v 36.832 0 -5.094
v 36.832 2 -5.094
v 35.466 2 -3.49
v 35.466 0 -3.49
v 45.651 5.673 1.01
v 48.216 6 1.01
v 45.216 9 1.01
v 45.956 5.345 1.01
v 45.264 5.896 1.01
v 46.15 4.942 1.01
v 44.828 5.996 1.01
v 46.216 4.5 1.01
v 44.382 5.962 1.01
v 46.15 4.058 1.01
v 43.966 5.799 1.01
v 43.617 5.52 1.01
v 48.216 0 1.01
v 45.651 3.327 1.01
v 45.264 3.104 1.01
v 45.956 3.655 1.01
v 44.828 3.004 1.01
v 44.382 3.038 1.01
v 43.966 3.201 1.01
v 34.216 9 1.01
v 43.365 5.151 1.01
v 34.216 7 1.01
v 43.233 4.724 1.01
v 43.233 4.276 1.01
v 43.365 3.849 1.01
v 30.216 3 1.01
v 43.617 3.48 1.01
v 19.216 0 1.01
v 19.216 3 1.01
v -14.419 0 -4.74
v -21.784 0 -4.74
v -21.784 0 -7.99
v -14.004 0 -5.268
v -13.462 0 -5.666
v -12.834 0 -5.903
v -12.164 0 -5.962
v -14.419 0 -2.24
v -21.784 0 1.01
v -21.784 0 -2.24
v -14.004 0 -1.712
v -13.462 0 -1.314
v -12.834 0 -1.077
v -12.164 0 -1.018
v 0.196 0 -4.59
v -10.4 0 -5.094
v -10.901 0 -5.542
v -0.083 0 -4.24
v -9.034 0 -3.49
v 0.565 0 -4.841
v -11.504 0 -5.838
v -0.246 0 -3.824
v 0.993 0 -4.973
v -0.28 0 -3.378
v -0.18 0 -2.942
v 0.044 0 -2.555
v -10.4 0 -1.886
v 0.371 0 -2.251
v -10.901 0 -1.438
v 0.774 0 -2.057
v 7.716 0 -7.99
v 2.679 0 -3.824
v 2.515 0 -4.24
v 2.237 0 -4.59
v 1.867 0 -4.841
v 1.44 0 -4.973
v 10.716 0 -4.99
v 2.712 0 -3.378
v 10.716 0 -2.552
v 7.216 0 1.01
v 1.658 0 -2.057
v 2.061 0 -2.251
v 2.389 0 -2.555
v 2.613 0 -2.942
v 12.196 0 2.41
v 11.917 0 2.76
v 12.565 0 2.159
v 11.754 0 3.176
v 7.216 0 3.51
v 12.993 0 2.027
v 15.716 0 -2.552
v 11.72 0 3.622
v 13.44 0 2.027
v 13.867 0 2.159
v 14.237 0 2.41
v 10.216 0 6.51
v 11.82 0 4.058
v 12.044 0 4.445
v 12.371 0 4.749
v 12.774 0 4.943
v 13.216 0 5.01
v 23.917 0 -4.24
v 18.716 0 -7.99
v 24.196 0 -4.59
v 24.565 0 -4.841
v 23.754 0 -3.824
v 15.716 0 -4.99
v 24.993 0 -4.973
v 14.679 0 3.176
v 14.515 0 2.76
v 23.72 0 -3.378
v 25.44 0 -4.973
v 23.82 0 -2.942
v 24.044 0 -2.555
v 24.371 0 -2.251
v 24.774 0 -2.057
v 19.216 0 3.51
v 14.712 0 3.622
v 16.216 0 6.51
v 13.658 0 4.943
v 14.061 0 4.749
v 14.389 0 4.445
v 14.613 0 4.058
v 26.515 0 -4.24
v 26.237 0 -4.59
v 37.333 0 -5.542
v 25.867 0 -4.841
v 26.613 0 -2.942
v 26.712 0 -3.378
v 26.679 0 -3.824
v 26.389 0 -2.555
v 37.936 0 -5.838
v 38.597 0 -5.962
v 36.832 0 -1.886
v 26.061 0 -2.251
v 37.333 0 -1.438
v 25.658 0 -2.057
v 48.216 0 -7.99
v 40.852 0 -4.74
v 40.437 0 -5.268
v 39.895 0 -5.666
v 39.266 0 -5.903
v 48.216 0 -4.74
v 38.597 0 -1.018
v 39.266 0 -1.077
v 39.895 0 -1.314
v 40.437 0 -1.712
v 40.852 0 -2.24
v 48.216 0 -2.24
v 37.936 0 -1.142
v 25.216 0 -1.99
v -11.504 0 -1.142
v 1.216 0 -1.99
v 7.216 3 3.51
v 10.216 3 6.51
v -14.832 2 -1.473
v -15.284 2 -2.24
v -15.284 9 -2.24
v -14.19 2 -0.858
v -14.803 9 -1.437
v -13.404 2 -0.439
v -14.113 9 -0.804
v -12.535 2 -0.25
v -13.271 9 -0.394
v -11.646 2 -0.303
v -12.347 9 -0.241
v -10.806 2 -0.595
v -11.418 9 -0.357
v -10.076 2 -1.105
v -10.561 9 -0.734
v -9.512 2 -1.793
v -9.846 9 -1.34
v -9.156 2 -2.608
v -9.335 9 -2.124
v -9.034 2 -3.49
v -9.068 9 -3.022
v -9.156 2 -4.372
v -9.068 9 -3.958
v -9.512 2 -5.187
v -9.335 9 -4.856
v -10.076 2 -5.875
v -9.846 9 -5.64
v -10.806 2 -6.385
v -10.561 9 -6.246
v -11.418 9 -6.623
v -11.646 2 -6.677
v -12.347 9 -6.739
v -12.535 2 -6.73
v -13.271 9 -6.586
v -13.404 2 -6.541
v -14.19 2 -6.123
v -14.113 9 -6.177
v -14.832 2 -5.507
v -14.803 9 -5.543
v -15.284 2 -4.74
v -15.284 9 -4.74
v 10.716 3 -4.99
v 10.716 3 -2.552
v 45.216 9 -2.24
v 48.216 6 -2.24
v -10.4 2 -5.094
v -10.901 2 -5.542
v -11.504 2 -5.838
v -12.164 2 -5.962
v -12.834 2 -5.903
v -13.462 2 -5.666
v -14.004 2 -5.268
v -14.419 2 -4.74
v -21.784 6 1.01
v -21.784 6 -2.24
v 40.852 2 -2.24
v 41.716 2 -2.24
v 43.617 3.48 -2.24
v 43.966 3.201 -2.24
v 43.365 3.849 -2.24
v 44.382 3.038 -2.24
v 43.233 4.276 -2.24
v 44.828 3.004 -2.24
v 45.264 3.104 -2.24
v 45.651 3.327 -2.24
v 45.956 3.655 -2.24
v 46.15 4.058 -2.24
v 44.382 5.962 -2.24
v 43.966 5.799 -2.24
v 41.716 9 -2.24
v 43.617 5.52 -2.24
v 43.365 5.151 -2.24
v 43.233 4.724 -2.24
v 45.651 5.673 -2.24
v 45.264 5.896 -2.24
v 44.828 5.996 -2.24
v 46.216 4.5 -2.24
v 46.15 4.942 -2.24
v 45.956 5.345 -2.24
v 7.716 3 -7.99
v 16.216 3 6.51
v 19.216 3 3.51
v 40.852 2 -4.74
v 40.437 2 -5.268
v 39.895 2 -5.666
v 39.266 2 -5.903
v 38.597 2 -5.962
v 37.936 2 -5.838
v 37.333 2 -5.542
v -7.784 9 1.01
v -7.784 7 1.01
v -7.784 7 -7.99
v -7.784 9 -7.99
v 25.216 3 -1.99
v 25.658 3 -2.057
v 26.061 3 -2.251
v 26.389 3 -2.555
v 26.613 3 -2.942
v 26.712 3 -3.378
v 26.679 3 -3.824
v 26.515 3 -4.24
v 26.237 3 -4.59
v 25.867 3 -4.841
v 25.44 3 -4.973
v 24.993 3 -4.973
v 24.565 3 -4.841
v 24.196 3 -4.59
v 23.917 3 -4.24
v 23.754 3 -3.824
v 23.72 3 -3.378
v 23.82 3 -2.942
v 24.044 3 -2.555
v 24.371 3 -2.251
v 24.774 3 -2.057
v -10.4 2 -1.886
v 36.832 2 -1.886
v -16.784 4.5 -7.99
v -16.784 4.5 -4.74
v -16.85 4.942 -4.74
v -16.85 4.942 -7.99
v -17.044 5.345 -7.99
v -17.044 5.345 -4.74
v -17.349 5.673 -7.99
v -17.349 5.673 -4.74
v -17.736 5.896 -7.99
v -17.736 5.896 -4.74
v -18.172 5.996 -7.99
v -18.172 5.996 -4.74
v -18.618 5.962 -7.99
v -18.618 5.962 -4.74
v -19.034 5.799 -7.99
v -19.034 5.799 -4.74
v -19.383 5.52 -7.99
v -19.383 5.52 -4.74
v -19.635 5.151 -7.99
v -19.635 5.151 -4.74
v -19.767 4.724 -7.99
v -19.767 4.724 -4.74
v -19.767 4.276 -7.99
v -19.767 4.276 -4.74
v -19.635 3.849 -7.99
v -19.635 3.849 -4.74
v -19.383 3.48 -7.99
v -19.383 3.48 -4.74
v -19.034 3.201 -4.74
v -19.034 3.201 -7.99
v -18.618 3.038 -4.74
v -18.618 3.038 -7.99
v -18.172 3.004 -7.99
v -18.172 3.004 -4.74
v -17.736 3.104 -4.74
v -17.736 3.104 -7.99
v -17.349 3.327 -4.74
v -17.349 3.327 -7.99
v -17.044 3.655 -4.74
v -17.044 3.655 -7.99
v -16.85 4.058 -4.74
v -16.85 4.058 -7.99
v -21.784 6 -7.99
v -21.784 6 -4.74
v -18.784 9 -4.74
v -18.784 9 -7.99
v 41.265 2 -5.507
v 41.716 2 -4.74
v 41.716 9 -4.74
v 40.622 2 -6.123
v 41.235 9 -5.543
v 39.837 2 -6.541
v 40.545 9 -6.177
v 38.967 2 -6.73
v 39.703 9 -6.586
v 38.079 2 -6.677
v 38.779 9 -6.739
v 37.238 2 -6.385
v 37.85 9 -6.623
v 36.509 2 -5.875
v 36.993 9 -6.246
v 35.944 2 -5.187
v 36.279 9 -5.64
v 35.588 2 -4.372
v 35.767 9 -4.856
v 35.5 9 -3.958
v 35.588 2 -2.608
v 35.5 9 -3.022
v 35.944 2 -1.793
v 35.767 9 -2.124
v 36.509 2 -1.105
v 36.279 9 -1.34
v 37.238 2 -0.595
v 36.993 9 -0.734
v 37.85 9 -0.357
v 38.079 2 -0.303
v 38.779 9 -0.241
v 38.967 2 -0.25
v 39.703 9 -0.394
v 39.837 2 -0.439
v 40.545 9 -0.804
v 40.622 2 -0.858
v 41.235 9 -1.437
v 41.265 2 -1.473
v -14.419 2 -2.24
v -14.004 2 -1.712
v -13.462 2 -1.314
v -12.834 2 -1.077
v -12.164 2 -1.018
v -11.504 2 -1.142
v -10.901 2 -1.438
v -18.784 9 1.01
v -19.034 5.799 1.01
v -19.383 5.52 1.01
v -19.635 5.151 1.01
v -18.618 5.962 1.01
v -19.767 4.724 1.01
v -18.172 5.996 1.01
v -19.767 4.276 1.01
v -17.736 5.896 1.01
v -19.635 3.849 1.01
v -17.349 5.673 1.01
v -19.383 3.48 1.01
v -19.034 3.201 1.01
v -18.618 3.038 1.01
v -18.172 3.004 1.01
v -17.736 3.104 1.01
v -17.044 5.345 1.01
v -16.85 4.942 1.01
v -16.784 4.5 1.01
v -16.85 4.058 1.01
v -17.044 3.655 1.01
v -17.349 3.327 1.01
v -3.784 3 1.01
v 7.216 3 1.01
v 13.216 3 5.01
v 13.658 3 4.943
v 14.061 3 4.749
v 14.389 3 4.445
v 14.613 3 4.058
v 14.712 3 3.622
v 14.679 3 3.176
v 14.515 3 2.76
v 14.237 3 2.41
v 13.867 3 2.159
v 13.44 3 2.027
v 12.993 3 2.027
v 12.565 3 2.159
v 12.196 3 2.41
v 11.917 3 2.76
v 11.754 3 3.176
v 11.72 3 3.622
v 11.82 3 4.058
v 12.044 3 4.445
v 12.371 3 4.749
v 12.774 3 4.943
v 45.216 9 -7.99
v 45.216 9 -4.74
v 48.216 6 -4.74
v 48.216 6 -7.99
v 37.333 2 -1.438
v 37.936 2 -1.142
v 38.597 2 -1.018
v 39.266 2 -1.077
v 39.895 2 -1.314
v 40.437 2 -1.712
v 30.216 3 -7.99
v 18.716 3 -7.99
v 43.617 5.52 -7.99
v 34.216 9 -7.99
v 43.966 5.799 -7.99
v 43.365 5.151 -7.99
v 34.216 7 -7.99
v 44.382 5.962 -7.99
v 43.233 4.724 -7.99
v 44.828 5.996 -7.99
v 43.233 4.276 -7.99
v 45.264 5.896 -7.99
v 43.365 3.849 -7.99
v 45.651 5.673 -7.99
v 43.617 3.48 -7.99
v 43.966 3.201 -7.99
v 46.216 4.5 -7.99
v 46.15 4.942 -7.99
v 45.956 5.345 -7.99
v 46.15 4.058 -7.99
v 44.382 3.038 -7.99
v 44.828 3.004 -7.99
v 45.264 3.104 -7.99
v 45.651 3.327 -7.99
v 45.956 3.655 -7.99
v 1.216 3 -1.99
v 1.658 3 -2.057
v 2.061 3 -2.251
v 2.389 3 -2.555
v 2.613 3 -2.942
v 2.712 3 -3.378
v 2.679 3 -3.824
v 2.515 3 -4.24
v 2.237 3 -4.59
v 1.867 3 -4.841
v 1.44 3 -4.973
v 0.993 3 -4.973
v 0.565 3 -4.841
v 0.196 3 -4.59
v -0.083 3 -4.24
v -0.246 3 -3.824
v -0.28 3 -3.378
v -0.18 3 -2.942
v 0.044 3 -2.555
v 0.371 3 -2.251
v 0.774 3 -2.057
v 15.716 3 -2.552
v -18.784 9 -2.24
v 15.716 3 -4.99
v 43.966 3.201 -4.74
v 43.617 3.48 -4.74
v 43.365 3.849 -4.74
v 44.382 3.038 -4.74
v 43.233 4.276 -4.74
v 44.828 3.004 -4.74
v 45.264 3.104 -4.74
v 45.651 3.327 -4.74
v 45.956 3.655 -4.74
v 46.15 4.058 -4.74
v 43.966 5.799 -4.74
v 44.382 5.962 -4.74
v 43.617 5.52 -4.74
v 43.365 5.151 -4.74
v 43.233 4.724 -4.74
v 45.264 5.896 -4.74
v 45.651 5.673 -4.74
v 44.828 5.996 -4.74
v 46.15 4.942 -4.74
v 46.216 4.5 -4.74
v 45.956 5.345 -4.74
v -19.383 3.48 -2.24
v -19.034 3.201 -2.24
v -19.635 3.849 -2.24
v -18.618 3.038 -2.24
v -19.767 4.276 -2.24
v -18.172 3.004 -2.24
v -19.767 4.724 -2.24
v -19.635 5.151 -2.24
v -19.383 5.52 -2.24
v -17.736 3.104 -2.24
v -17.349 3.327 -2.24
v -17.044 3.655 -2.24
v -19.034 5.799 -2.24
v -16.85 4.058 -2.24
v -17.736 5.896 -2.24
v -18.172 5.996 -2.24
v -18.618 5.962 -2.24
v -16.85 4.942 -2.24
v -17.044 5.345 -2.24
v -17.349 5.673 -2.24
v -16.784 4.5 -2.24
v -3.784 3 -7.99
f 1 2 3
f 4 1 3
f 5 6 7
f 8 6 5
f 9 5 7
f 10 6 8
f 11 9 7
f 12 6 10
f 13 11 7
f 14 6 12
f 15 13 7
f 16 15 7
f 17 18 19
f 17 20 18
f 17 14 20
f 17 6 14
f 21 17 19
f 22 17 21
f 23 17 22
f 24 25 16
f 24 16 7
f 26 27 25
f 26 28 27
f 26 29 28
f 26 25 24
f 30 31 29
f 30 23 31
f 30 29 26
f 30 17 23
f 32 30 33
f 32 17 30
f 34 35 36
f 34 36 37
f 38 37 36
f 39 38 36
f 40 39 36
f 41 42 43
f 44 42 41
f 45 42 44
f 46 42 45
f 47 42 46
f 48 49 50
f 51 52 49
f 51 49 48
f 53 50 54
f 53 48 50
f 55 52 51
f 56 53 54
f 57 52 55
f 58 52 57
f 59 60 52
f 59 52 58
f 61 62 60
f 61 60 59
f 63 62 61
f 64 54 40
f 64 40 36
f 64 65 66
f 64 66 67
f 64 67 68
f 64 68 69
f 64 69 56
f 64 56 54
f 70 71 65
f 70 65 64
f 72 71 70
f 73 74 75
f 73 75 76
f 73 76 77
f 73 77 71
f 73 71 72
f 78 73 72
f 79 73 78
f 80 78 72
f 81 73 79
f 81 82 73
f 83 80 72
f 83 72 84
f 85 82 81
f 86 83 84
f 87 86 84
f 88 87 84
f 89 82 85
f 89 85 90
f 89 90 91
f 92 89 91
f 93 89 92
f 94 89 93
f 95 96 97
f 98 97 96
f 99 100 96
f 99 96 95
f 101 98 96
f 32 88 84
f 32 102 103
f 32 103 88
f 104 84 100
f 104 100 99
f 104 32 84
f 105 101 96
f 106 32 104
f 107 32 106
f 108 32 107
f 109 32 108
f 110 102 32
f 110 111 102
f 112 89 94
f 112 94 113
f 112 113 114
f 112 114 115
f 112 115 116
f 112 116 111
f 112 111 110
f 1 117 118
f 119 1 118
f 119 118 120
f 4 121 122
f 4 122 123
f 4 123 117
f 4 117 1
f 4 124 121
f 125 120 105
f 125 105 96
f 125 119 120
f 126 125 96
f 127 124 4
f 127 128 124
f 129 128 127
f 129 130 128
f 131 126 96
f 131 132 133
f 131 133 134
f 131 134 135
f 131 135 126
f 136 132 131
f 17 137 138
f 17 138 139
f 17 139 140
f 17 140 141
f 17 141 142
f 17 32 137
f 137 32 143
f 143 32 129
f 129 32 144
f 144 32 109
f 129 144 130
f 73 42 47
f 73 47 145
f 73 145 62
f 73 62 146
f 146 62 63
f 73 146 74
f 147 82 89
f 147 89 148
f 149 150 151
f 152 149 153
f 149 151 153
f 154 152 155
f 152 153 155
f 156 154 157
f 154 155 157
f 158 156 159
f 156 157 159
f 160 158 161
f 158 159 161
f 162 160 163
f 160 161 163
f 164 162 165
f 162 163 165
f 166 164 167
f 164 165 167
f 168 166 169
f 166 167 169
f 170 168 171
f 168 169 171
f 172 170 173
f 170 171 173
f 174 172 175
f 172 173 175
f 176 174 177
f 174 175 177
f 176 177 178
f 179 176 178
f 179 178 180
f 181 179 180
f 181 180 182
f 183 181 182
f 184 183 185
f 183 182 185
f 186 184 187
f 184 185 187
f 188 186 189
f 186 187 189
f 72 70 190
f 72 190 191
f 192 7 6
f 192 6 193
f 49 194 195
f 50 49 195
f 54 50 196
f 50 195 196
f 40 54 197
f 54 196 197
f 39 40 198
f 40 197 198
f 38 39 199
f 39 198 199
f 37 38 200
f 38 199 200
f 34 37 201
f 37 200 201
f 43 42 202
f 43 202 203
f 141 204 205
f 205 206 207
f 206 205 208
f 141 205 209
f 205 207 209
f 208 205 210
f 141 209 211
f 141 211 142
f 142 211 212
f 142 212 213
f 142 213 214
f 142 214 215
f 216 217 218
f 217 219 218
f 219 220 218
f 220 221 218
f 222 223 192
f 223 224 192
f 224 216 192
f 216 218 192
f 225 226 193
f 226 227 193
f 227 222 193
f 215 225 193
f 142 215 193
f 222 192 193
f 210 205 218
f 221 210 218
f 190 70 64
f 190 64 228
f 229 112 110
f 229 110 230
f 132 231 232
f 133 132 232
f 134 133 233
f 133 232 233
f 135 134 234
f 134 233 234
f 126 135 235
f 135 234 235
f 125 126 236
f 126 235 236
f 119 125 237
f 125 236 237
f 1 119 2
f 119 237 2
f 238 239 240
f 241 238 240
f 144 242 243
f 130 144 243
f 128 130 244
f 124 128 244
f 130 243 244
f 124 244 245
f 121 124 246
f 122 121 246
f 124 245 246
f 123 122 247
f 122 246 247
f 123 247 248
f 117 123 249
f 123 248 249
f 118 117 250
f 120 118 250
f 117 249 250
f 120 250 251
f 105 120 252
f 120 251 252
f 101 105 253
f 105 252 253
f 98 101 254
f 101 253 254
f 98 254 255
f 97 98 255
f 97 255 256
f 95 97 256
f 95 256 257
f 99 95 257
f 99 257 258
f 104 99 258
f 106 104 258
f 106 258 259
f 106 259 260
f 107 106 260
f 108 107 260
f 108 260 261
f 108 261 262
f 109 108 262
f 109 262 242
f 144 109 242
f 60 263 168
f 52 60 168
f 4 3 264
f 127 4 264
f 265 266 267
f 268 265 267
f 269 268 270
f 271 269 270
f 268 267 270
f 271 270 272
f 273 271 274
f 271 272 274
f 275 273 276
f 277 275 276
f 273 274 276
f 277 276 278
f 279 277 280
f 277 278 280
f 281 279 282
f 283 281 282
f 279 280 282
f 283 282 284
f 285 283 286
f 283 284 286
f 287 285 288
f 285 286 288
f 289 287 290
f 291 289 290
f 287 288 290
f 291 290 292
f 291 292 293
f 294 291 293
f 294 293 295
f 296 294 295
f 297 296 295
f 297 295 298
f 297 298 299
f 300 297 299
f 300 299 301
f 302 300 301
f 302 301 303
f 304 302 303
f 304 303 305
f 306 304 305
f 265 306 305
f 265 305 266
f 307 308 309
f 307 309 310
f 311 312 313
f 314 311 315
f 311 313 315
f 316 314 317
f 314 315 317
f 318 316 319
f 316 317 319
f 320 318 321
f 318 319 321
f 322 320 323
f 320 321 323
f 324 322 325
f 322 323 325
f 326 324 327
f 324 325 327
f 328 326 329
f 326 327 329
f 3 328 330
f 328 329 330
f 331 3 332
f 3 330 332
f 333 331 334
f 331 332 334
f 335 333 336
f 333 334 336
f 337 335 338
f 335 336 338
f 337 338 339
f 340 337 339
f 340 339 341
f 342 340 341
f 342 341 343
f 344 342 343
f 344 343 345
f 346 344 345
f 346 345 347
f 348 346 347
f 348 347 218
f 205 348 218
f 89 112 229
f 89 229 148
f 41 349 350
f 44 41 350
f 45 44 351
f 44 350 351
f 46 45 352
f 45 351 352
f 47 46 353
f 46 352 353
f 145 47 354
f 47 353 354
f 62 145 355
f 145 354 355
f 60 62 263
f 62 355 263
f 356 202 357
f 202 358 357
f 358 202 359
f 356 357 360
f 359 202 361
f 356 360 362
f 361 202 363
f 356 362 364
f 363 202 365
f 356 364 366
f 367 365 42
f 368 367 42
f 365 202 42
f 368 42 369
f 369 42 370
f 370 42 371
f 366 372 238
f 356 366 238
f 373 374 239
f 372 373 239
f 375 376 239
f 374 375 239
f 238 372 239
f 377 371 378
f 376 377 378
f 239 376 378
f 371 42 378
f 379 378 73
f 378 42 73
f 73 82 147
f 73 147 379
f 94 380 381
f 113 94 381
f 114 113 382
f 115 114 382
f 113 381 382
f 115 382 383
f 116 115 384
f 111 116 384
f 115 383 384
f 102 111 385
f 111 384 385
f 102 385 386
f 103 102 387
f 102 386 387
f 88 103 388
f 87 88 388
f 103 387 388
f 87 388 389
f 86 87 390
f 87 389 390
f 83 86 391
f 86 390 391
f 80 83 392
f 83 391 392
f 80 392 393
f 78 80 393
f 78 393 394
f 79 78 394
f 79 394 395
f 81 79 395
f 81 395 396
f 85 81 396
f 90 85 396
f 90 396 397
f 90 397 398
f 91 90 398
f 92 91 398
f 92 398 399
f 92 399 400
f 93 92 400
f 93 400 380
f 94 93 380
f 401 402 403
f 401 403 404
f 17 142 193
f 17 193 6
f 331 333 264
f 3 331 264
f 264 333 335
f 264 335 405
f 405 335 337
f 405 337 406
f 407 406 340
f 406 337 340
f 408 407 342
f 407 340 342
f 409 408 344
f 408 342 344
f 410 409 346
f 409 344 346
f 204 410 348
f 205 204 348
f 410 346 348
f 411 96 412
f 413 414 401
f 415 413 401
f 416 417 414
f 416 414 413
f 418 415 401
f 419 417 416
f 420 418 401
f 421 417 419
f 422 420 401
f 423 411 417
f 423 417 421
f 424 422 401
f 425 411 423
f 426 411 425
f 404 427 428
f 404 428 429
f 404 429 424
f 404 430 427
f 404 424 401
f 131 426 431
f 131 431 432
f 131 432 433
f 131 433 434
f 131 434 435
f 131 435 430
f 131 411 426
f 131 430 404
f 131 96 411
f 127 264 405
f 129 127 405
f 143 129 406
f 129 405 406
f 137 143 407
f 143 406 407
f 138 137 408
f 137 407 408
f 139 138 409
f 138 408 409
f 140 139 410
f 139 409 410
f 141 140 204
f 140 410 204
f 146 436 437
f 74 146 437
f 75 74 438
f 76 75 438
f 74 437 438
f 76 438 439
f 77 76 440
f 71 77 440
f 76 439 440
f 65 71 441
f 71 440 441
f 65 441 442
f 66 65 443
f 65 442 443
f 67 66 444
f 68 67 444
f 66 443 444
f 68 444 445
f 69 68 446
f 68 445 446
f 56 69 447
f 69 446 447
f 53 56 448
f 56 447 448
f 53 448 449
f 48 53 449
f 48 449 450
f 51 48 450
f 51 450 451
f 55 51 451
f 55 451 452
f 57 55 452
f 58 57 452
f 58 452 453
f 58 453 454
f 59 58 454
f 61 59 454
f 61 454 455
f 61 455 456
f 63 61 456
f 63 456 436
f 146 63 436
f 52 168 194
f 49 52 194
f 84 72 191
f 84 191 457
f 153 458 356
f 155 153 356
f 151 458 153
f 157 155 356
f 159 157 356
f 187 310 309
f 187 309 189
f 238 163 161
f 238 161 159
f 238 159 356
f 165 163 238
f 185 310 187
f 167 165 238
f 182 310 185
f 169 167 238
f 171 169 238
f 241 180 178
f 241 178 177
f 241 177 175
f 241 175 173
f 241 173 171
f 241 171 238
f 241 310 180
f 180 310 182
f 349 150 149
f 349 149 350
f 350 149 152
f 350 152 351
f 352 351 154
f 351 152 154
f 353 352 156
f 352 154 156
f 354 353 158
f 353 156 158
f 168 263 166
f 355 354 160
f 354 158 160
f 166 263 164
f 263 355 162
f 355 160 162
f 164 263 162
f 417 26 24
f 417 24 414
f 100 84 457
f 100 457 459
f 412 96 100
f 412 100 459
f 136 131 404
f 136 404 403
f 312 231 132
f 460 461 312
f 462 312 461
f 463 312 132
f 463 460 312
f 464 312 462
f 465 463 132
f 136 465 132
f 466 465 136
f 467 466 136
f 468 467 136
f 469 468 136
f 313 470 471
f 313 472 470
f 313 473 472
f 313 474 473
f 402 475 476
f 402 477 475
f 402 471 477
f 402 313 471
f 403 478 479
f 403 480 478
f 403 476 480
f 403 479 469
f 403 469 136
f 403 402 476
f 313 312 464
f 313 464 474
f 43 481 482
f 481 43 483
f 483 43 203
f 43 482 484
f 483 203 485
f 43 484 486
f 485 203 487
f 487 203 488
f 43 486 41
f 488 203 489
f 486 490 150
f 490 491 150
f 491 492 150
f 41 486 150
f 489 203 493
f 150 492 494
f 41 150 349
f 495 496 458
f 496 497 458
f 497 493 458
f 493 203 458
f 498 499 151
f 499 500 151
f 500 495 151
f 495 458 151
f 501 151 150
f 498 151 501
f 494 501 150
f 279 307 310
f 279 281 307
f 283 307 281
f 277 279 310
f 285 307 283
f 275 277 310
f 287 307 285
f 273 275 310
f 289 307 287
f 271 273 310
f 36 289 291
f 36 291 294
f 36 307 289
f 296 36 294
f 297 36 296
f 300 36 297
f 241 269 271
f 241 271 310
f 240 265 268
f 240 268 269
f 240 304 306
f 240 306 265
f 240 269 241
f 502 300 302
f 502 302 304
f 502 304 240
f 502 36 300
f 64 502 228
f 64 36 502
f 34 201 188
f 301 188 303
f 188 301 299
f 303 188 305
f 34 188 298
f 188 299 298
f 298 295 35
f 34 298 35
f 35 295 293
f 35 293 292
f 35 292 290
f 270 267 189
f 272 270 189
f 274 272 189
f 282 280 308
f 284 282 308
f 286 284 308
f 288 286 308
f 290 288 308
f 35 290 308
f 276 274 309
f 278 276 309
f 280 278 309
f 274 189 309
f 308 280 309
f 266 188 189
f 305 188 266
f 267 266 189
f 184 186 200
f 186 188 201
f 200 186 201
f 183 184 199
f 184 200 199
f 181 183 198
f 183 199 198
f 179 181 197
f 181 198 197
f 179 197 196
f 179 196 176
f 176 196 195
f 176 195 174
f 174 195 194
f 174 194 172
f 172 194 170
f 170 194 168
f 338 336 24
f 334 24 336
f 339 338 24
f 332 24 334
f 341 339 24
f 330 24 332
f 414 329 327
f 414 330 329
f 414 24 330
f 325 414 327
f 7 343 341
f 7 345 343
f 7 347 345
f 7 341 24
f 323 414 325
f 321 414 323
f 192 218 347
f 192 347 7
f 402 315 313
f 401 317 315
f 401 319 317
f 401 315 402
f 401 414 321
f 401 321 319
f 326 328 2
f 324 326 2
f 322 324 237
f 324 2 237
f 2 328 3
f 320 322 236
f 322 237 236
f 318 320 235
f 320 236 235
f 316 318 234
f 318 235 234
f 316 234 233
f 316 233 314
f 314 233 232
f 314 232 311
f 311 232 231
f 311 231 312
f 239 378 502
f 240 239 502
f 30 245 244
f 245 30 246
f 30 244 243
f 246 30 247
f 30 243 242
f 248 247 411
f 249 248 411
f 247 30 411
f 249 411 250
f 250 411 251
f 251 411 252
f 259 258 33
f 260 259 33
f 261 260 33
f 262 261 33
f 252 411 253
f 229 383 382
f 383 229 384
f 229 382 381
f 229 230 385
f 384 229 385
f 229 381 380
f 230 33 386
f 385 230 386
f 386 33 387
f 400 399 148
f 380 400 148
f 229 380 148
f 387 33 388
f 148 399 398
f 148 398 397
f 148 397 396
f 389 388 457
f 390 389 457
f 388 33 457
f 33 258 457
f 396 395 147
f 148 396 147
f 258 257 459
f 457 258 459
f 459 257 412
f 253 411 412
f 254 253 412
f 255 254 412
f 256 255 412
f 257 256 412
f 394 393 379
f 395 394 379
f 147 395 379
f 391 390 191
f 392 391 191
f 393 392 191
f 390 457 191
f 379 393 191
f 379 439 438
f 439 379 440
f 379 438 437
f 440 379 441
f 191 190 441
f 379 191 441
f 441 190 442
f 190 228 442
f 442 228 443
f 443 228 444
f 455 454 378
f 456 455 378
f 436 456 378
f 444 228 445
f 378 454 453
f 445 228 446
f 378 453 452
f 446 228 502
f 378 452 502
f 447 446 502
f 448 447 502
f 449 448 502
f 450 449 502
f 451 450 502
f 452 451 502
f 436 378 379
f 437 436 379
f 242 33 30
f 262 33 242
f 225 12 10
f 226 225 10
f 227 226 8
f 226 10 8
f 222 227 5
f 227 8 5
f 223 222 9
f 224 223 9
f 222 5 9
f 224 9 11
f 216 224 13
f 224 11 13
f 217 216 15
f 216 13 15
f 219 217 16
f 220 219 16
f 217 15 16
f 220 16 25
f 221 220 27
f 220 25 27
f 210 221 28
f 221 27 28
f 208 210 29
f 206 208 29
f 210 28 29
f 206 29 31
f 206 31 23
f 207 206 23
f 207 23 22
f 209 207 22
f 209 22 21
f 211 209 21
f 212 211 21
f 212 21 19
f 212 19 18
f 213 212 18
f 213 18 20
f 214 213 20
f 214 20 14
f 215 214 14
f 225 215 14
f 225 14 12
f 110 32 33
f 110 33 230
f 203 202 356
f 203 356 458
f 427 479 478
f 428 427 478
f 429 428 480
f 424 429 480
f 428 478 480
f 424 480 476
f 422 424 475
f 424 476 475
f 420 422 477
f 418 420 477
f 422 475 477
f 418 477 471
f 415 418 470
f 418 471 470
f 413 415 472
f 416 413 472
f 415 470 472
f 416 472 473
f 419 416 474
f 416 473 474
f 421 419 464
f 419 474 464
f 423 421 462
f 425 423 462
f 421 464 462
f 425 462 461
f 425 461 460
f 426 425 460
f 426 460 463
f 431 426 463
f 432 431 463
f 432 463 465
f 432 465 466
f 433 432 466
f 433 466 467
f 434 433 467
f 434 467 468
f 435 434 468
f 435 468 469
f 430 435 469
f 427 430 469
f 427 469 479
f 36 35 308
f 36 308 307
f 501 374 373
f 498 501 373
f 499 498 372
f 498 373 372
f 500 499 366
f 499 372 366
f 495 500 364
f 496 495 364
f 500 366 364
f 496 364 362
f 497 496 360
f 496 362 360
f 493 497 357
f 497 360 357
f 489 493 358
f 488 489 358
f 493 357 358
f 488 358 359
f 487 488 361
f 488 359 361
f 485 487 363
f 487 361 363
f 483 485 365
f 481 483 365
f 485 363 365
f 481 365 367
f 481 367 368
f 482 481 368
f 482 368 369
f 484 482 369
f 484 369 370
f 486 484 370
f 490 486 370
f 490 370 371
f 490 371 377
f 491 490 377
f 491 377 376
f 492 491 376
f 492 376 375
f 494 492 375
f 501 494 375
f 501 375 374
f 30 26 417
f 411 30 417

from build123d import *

# Parameters (mm, degrees)
BOSS_EXTRU_1_DEPTH      = 3
ESQUISSE2_W             = 14
ESQUISSE2_H             = 9
BOSS_EXTRU_2_DEPTH      = 6
ESQUISSE3_R             = 3.25
ENL_V_MAT_EXTRU_1_DEPTH = 50.69554375
CHANFREIN1_SIZE         = 4
ESQUISSE4_R             = 1.5
ENL_V_MAT_EXTRU_2_DEPTH = 50.240705403
ESQUISSE5_W             = 9.5
ESQUISSE5_H             = 2.5
ENL_V_MAT_EXTRU_3_DEPTH = 50.69554375
ESQUISSE6_R             = 1.5
ENL_V_MAT_EXTRU_4_DEPTH = 50.86789407
CHANFREIN2_SIZE         = 3
CHANFREIN3_SIZE         = 3
BOSS_EXTRU_3_START      = -2
BOSS_EXTRU_3_DEPTH      = 2


with BuildPart() as part:
    # Esquisse1 → Boss.-Extru.1 (new body)
    with BuildSketch(Plane(origin=(0, 0, 0), x_dir=(1, 0, 0), z_dir=(0, 1, 0))):
        Polygon((-21.783749016, 7.99000686), (10.716250984, 7.99000686), (10.716250984, 2.552277958), (15.716250984, 2.552277958), (15.716250984, 7.99000686), (48.216250984, 7.99000686), (48.216250984, -1.00999314), (19.216250984, -1.00999314), (19.216250984, -6.50999314), (7.216250984, -6.50999314), (7.216250984, -1.00999314), (-21.783749016, -1.00999314), align=None)
    extrude(amount=BOSS_EXTRU_1_DEPTH)

    # Esquisse2 → Boss.-Extru.2 (add)
    with BuildSketch(Plane(origin=(0, 3, 0), x_dir=(1, 0, 0), z_dir=(0, 1, 0))):
        with Locations((-14.783749016, 3.49000686)):
            Rectangle(ESQUISSE2_W, ESQUISSE2_H)
        with Locations((41.216250984, 3.49000686)):
            Rectangle(ESQUISSE2_W, ESQUISSE2_H)
    extrude(amount=BOSS_EXTRU_2_DEPTH)

    # Esquisse3 → Enlèv. mat.-Extru.1 (cut, through all)
    with BuildSketch(Plane(origin=(0, 9, 0), x_dir=(1, 0, 0), z_dir=(0, 1, 0))):
        with Locations(Location((-12.283749016, 3.49000686, 0), (0, 0, 270))):
            Circle(ESQUISSE3_R)
        with Locations(Location((38.716250984, 3.49000686, 0), (0, 0, 270))):
            Circle(ESQUISSE3_R)
    extrude(amount=-ENL_V_MAT_EXTRU_1_DEPTH, mode=Mode.SUBTRACT)

    # Chanfrein1
    chanfrein1_edges = [part.edges().sort_by_distance(p)[0] for p in [
        (-7.783749016, 3, -3.49000686),
        (34.216250984, 3, -3.49000686),
    ]]
    chamfer(chanfrein1_edges, length=CHANFREIN1_SIZE)

    # Esquisse4 → Enlèv. mat.-Extru.2 (cut, through all)
    with BuildSketch(Plane(origin=(0, 3, 0), x_dir=(1, 0, 0), z_dir=(0, 1, 0))):
        with Locations(Location((1.216250984, 3.49000686, 0), (0, 0, 270))):
            Circle(ESQUISSE4_R)
        with Locations(Location((25.216250984, 3.49000686, 0), (0, 0, 270))):
            Circle(ESQUISSE4_R)
        with Locations(Location((13.216250984, -3.50999314, 0), (0, 0, 270))):
            Circle(ESQUISSE4_R)
    extrude(amount=-ENL_V_MAT_EXTRU_2_DEPTH, mode=Mode.SUBTRACT)

    # Esquisse5 → Enlèv. mat.-Extru.3 (cut, through all)
    with BuildSketch(Plane(origin=(0, 9, 0), x_dir=(1, 0, 0), z_dir=(0, 1, 0))):
        with Locations((-17.033749016, 3.49000686)):
            Rectangle(ESQUISSE5_W, ESQUISSE5_H)
        with Locations((43.466250984, 3.49000686)):
            Rectangle(ESQUISSE5_W, ESQUISSE5_H)
    extrude(amount=-ENL_V_MAT_EXTRU_3_DEPTH, mode=Mode.SUBTRACT)

    # Esquisse6 → Enlèv. mat.-Extru.4 (cut, through all)
    with BuildSketch(Plane.XY.offset(1.00999314)):
        with Locations((-18.283749016, 4.5)):
            Circle(ESQUISSE6_R)
        with Locations((44.716250984, 4.5)):
            Circle(ESQUISSE6_R)
    extrude(amount=-ENL_V_MAT_EXTRU_4_DEPTH, mode=Mode.SUBTRACT)

    # Chanfrein2
    chanfrein2_edges = [part.edges().sort_by_distance(p)[0] for p in [
        (48.216250984, 9, -6.36500686),
        (-21.783749016, 9, -6.36500686),
        (48.216250984, 9, -0.61500686),
        (-21.783749016, 9, -0.61500686),
    ]]
    chamfer(chanfrein2_edges, length=CHANFREIN2_SIZE)

    # Chanfrein3
    chanfrein3_edges = [part.edges().sort_by_distance(p)[0] for p in [
        (19.216250984, 1.5, 6.50999314),
        (7.216250984, 1.5, 6.50999314),
        (15.716250984, 1.5, -7.99000686),
        (10.716250984, 1.5, -7.99000686),
    ]]
    chamfer(chanfrein3_edges, length=CHANFREIN3_SIZE)

    # Esquisse7 → Boss.-Extru.3 (add)
    with BuildSketch(Plane.XZ.offset(BOSS_EXTRU_3_START)):
        with BuildLine():
            Line((-10.399834705, -1.885766111), (-9.033749016, -3.49000686))
            ThreePointArc((-9.033749016, -3.49000686), (-11.646371576, -0.303119664), (-15.283749016, -2.24000686))
            Line((-15.283749016, -2.24000686), (-14.419216531, -2.24000686))
            ThreePointArc((-14.419216531, -2.24000686), (-12.500984788, -1.025147811), (-10.399834705, -1.885766111))
        make_face()
        with BuildLine():
            Line((-14.419216531, -4.74000686), (-15.283749016, -4.74000686))
            ThreePointArc((-15.283749016, -4.74000686), (-11.646371576, -6.676894056), (-9.033749016, -3.49000686))
            Line((-9.033749016, -3.49000686), (-10.399834705, -5.094247608))
            ThreePointArc((-10.399834705, -5.094247608), (-12.500984788, -5.954865908), (-14.419216531, -4.74000686))
        make_face()
        with BuildLine():
            ThreePointArc((41.716250984, -2.24000686), (38.078873545, -0.303119664), (35.466250984, -3.49000686))
            Line((35.466250984, -3.49000686), (36.832336674, -1.885766111))
            ThreePointArc((36.832336674, -1.885766111), (38.933486757, -1.025147811), (40.8517185, -2.24000686))
            Line((40.8517185, -2.24000686), (41.716250984, -2.24000686))
        make_face()
        with BuildLine():
            Line((36.832336674, -5.094247608), (35.466250984, -3.49000686))
            ThreePointArc((35.466250984, -3.49000686), (38.078873545, -6.676894056), (41.716250984, -4.74000686))
            Line((41.716250984, -4.74000686), (40.8517185, -4.74000686))
            ThreePointArc((40.8517185, -4.74000686), (38.933486757, -5.954865908), (36.832336674, -5.094247608))
        make_face()
    extrude(amount=BOSS_EXTRU_3_DEPTH)


solid = part.part
